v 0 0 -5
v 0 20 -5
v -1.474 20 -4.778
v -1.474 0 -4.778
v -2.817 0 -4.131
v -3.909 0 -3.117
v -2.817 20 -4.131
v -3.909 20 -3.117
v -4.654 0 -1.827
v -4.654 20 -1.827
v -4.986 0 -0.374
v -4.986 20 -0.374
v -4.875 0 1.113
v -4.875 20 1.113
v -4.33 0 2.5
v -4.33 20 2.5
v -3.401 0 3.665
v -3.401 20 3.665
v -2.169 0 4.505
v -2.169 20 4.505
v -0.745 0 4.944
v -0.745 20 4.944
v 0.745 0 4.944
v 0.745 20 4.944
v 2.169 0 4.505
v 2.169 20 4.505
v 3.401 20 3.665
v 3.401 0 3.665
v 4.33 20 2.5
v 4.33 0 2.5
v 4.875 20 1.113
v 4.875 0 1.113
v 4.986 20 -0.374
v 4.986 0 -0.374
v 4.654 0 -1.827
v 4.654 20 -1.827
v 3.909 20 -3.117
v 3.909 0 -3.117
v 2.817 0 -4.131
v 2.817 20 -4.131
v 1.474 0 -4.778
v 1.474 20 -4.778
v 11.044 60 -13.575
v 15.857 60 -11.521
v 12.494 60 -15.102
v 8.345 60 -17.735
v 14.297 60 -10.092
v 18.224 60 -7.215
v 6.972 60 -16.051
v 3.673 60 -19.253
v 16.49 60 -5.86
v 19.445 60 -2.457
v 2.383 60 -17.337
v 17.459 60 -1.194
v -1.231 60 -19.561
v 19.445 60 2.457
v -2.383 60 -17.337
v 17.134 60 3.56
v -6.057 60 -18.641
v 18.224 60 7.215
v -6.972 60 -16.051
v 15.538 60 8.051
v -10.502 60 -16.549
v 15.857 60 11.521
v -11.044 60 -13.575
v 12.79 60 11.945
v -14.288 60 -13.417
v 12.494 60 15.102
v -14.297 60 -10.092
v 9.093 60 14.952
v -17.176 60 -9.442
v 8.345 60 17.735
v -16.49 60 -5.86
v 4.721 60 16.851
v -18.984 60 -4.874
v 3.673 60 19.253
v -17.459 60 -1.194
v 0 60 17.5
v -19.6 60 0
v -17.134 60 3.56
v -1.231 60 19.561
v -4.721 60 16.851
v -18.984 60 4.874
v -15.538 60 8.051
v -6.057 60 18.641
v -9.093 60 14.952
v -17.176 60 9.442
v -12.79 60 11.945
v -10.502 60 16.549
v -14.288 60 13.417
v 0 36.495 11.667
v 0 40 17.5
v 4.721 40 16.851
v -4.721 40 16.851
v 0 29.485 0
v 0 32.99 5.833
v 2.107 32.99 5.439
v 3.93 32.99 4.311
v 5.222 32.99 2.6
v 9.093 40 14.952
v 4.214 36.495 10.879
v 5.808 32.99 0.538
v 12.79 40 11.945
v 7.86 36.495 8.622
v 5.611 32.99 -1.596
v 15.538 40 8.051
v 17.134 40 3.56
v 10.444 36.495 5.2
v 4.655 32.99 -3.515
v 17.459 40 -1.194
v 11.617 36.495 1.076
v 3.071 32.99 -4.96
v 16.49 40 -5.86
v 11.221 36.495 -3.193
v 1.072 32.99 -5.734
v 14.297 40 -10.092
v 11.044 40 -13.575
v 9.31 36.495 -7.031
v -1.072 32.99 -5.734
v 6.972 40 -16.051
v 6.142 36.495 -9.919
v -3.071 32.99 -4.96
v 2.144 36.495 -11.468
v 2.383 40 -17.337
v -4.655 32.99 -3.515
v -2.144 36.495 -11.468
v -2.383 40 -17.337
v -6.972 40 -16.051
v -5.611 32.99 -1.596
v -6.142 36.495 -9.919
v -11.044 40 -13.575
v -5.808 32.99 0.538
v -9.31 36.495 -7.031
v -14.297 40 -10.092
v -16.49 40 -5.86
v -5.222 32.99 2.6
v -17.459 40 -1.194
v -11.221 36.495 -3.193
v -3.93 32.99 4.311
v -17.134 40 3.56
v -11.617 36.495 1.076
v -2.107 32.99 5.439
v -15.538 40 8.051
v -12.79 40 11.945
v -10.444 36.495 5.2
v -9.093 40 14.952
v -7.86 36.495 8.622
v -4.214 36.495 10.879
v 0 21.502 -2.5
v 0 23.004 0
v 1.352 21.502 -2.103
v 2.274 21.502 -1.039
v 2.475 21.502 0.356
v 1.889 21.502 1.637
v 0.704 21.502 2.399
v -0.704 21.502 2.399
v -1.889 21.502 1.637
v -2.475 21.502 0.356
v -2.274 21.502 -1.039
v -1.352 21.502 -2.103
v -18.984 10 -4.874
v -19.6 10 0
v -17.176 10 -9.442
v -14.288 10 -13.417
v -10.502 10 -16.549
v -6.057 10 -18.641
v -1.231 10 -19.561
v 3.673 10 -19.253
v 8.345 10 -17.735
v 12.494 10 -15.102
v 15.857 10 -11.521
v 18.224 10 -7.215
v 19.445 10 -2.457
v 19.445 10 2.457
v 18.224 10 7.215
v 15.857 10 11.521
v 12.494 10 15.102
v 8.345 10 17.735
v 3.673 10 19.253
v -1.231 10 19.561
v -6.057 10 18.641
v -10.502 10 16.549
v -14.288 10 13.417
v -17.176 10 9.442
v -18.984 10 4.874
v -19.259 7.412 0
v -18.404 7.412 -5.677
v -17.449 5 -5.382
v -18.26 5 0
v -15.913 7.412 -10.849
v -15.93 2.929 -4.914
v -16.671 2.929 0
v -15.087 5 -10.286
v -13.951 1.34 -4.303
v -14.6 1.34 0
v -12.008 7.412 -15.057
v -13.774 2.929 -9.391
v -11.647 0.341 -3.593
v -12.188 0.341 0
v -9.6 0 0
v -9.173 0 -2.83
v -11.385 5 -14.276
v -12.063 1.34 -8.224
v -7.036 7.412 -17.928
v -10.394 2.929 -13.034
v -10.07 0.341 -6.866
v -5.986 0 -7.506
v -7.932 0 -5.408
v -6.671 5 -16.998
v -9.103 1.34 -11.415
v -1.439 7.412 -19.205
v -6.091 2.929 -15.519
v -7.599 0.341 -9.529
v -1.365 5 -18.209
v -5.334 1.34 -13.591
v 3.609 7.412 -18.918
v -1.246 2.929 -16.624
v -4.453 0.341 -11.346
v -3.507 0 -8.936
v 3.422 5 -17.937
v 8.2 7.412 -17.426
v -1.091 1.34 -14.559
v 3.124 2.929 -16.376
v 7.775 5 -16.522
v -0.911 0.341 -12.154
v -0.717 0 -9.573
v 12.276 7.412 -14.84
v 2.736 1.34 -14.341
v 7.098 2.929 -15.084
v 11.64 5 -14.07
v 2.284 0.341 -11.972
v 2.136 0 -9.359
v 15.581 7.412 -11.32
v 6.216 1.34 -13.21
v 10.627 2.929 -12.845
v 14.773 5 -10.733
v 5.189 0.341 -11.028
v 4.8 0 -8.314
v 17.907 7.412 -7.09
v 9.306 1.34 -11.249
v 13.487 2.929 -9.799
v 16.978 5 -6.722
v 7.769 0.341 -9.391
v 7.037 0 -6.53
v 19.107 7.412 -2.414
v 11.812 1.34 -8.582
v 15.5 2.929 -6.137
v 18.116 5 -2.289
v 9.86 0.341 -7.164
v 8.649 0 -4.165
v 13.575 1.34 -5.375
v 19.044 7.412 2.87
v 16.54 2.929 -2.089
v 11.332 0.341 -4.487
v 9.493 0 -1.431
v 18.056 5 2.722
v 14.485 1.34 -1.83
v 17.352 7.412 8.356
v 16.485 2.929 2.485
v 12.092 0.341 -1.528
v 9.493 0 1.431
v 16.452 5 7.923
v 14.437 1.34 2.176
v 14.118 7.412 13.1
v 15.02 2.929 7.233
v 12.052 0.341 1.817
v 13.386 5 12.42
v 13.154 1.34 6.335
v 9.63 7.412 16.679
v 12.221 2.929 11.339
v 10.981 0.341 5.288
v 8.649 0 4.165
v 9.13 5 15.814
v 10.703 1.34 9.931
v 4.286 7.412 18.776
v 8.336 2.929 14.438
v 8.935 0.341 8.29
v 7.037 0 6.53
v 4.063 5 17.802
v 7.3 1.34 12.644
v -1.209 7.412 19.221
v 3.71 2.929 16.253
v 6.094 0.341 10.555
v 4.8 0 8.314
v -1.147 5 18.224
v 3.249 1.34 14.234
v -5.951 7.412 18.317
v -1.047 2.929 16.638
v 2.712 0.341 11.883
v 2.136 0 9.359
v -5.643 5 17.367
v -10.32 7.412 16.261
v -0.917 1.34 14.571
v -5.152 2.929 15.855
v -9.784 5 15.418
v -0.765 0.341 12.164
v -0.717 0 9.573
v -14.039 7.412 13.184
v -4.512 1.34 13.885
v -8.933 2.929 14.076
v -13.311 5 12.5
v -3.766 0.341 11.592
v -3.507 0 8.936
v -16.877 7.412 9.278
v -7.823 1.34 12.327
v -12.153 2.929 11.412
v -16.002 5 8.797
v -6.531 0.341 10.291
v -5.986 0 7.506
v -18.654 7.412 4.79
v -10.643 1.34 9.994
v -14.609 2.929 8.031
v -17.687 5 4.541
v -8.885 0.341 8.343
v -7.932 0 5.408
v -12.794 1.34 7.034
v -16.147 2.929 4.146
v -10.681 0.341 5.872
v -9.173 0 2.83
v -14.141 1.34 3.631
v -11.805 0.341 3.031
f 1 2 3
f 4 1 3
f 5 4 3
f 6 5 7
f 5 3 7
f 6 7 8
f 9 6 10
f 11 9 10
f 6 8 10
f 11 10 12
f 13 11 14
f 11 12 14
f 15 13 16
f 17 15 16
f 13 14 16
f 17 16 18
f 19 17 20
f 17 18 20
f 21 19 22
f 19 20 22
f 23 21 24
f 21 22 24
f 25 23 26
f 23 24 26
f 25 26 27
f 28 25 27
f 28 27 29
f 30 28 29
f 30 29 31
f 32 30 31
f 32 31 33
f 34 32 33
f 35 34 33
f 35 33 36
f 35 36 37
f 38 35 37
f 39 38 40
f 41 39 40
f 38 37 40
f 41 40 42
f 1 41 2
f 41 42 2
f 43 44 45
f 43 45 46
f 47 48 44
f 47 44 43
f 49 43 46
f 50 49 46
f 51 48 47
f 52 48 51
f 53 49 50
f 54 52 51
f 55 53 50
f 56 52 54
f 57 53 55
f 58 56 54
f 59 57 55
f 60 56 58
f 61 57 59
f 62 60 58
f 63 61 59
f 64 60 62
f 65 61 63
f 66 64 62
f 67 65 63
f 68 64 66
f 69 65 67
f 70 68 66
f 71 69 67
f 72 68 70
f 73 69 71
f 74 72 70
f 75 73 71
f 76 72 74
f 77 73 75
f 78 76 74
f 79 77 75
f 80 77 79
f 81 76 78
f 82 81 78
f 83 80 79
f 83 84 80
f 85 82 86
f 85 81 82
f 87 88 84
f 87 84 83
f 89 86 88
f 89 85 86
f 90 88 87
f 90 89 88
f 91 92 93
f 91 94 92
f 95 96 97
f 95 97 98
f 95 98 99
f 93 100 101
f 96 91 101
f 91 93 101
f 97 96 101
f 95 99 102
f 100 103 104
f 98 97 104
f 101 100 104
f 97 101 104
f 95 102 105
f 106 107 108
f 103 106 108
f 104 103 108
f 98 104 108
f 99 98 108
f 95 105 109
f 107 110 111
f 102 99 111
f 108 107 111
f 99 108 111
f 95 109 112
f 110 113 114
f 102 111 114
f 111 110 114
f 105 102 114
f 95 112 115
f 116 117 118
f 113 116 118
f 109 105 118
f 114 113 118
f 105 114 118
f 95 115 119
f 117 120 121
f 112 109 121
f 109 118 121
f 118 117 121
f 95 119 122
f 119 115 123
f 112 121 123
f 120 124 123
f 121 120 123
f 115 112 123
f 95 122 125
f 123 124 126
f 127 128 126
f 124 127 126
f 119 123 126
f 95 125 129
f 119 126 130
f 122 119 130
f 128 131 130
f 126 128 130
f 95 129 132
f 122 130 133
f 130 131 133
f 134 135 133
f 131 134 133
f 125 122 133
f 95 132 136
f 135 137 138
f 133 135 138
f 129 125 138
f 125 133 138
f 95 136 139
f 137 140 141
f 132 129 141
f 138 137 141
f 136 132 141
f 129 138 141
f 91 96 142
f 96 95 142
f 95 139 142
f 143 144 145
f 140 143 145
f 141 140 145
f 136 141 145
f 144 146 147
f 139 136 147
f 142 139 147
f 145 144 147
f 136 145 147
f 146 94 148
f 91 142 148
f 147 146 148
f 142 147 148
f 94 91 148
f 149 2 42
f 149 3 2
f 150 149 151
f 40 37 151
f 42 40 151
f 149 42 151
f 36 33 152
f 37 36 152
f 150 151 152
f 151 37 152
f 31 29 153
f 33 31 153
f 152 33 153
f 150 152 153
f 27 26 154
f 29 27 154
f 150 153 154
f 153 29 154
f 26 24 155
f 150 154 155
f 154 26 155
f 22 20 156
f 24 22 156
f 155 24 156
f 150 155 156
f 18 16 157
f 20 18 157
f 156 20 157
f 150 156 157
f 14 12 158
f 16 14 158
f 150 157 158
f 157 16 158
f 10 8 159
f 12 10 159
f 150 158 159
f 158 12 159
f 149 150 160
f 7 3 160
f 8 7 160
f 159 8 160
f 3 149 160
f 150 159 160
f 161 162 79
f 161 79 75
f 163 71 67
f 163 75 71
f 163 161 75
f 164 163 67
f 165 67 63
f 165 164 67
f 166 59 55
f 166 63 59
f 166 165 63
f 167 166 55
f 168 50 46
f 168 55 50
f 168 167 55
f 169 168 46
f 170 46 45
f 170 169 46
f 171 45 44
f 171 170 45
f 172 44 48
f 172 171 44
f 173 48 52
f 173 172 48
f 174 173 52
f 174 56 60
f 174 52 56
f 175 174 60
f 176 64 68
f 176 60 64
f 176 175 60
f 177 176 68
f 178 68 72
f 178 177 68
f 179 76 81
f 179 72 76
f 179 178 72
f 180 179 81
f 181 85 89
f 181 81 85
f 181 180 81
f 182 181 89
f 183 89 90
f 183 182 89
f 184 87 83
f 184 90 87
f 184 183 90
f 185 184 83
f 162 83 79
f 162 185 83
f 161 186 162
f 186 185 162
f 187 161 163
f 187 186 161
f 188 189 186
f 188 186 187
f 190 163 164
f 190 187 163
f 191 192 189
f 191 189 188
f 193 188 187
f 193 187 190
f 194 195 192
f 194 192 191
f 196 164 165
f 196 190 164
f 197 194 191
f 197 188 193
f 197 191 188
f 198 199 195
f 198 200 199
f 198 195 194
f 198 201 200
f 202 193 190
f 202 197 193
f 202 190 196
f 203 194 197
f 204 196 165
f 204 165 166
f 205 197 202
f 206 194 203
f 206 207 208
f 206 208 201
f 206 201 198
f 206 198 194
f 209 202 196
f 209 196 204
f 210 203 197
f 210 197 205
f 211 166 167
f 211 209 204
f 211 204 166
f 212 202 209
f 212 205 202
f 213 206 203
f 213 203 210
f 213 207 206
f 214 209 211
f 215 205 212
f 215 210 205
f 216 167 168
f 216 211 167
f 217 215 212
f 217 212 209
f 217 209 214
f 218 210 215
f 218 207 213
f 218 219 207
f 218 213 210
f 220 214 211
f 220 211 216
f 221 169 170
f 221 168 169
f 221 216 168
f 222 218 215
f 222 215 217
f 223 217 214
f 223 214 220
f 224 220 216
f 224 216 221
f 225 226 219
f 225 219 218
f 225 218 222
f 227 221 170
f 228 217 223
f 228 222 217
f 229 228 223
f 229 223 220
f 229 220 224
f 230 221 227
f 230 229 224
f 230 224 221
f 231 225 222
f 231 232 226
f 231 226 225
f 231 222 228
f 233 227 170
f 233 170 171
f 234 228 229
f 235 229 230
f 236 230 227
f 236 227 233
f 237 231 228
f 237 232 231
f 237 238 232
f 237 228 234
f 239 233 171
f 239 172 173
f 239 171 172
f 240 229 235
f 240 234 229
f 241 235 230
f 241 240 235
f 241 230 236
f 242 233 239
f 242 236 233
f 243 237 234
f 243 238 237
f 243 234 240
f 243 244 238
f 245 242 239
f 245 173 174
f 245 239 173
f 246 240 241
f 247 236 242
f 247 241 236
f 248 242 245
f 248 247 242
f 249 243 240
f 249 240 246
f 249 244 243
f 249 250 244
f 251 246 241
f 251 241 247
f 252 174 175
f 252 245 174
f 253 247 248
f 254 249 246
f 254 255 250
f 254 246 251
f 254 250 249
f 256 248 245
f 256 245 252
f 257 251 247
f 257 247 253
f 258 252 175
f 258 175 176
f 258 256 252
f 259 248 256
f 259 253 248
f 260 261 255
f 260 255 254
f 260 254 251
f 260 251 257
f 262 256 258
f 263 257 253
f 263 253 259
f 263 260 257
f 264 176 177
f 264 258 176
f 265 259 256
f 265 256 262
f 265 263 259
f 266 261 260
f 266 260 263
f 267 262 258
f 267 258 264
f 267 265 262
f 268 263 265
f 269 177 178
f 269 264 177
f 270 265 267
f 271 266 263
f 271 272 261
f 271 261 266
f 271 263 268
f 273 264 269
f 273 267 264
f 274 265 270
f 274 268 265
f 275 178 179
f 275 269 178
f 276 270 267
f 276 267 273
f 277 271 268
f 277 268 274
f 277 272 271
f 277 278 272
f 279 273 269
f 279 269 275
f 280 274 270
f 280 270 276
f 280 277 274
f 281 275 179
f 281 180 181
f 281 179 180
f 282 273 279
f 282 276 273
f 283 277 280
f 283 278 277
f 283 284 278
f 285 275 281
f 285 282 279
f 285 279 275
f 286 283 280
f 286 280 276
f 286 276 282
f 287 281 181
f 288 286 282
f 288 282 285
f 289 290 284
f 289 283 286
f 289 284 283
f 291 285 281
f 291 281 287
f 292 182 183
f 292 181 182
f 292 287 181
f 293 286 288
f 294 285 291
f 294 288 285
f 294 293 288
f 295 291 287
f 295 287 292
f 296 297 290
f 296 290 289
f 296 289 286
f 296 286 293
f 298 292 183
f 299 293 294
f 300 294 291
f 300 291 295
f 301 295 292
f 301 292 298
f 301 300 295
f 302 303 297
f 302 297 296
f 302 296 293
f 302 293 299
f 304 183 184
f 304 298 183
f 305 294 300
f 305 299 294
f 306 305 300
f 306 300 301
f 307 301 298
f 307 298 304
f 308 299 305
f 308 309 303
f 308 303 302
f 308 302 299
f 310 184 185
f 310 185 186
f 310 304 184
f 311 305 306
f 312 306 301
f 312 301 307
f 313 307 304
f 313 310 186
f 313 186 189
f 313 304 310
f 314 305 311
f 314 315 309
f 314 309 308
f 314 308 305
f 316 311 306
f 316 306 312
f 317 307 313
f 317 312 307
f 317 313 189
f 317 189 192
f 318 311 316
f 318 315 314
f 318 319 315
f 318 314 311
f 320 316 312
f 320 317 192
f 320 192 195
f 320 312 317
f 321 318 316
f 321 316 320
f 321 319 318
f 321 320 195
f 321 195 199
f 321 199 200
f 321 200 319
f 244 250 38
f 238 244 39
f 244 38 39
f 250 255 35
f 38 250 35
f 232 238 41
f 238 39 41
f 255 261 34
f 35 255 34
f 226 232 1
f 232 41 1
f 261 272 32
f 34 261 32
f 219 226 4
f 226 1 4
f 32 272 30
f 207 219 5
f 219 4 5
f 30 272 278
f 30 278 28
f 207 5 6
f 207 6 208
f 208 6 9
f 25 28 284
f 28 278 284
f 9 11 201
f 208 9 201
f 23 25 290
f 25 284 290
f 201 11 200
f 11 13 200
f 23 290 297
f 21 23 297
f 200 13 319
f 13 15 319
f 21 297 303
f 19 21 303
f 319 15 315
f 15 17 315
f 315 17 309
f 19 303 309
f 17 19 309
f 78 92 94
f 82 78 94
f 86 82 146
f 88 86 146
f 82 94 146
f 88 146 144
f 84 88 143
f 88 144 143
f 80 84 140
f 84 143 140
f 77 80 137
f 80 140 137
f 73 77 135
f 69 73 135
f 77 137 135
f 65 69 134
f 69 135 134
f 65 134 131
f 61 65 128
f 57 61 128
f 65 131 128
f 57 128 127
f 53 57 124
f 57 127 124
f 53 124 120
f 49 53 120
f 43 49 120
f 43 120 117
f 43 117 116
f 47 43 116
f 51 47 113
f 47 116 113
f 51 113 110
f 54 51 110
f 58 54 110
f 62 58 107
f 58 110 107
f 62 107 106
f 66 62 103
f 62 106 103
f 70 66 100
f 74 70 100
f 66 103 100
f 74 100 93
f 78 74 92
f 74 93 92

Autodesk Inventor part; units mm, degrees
ref_plane "YZ Plane" through (0, 0, 0) normal (1, 0, 0) x (0, 1, 0)
ref_plane "XZ Plane" through (0, 0, 0) normal (0, 1, 0) x (-1, 0, 0)
ref_plane "XY Plane" through (0, 0, 0) normal (0, 0, 1) x (1, 0, 0)
sketch "Boceto1" plane through (0, 0, 0) normal (0, 1, 0) x (-1, 0, 0)
  circle A0 centre (0, 0) radius 19.6
  dimension "d0" = 39.2
extrude "Extrusión1" add sketch "Boceto1" along normal blind 60
sketch "Boceto2" plane through (0, 60, 0) normal (0, 1, 0) x (1, 0, 0)
  circle A0 centre (0, 0) radius 19.6 projected
hole "Agujero1" at (0, 60, 0) direction (0, -1, 0) diameter 35 depth 20 tip angle 118
sketch "Boceto3" plane through (0, 0, 0) normal (0, -1, 0) x (1, 0, 0)
  circle A0 centre (0, 0) radius 19.6 projected
hole "Agujero2" at (0, 0, 0) direction (0, 1, 0) diameter 10 depth 20 tip angle 118
thread "Rosca1" size "M10x1.5" class "6H" standard "ANSI Metric M Profile" full length
fillet "Empalme1" radius 10 1 edges at (19.6, 0, 0)
properties part number "Casquillo"
